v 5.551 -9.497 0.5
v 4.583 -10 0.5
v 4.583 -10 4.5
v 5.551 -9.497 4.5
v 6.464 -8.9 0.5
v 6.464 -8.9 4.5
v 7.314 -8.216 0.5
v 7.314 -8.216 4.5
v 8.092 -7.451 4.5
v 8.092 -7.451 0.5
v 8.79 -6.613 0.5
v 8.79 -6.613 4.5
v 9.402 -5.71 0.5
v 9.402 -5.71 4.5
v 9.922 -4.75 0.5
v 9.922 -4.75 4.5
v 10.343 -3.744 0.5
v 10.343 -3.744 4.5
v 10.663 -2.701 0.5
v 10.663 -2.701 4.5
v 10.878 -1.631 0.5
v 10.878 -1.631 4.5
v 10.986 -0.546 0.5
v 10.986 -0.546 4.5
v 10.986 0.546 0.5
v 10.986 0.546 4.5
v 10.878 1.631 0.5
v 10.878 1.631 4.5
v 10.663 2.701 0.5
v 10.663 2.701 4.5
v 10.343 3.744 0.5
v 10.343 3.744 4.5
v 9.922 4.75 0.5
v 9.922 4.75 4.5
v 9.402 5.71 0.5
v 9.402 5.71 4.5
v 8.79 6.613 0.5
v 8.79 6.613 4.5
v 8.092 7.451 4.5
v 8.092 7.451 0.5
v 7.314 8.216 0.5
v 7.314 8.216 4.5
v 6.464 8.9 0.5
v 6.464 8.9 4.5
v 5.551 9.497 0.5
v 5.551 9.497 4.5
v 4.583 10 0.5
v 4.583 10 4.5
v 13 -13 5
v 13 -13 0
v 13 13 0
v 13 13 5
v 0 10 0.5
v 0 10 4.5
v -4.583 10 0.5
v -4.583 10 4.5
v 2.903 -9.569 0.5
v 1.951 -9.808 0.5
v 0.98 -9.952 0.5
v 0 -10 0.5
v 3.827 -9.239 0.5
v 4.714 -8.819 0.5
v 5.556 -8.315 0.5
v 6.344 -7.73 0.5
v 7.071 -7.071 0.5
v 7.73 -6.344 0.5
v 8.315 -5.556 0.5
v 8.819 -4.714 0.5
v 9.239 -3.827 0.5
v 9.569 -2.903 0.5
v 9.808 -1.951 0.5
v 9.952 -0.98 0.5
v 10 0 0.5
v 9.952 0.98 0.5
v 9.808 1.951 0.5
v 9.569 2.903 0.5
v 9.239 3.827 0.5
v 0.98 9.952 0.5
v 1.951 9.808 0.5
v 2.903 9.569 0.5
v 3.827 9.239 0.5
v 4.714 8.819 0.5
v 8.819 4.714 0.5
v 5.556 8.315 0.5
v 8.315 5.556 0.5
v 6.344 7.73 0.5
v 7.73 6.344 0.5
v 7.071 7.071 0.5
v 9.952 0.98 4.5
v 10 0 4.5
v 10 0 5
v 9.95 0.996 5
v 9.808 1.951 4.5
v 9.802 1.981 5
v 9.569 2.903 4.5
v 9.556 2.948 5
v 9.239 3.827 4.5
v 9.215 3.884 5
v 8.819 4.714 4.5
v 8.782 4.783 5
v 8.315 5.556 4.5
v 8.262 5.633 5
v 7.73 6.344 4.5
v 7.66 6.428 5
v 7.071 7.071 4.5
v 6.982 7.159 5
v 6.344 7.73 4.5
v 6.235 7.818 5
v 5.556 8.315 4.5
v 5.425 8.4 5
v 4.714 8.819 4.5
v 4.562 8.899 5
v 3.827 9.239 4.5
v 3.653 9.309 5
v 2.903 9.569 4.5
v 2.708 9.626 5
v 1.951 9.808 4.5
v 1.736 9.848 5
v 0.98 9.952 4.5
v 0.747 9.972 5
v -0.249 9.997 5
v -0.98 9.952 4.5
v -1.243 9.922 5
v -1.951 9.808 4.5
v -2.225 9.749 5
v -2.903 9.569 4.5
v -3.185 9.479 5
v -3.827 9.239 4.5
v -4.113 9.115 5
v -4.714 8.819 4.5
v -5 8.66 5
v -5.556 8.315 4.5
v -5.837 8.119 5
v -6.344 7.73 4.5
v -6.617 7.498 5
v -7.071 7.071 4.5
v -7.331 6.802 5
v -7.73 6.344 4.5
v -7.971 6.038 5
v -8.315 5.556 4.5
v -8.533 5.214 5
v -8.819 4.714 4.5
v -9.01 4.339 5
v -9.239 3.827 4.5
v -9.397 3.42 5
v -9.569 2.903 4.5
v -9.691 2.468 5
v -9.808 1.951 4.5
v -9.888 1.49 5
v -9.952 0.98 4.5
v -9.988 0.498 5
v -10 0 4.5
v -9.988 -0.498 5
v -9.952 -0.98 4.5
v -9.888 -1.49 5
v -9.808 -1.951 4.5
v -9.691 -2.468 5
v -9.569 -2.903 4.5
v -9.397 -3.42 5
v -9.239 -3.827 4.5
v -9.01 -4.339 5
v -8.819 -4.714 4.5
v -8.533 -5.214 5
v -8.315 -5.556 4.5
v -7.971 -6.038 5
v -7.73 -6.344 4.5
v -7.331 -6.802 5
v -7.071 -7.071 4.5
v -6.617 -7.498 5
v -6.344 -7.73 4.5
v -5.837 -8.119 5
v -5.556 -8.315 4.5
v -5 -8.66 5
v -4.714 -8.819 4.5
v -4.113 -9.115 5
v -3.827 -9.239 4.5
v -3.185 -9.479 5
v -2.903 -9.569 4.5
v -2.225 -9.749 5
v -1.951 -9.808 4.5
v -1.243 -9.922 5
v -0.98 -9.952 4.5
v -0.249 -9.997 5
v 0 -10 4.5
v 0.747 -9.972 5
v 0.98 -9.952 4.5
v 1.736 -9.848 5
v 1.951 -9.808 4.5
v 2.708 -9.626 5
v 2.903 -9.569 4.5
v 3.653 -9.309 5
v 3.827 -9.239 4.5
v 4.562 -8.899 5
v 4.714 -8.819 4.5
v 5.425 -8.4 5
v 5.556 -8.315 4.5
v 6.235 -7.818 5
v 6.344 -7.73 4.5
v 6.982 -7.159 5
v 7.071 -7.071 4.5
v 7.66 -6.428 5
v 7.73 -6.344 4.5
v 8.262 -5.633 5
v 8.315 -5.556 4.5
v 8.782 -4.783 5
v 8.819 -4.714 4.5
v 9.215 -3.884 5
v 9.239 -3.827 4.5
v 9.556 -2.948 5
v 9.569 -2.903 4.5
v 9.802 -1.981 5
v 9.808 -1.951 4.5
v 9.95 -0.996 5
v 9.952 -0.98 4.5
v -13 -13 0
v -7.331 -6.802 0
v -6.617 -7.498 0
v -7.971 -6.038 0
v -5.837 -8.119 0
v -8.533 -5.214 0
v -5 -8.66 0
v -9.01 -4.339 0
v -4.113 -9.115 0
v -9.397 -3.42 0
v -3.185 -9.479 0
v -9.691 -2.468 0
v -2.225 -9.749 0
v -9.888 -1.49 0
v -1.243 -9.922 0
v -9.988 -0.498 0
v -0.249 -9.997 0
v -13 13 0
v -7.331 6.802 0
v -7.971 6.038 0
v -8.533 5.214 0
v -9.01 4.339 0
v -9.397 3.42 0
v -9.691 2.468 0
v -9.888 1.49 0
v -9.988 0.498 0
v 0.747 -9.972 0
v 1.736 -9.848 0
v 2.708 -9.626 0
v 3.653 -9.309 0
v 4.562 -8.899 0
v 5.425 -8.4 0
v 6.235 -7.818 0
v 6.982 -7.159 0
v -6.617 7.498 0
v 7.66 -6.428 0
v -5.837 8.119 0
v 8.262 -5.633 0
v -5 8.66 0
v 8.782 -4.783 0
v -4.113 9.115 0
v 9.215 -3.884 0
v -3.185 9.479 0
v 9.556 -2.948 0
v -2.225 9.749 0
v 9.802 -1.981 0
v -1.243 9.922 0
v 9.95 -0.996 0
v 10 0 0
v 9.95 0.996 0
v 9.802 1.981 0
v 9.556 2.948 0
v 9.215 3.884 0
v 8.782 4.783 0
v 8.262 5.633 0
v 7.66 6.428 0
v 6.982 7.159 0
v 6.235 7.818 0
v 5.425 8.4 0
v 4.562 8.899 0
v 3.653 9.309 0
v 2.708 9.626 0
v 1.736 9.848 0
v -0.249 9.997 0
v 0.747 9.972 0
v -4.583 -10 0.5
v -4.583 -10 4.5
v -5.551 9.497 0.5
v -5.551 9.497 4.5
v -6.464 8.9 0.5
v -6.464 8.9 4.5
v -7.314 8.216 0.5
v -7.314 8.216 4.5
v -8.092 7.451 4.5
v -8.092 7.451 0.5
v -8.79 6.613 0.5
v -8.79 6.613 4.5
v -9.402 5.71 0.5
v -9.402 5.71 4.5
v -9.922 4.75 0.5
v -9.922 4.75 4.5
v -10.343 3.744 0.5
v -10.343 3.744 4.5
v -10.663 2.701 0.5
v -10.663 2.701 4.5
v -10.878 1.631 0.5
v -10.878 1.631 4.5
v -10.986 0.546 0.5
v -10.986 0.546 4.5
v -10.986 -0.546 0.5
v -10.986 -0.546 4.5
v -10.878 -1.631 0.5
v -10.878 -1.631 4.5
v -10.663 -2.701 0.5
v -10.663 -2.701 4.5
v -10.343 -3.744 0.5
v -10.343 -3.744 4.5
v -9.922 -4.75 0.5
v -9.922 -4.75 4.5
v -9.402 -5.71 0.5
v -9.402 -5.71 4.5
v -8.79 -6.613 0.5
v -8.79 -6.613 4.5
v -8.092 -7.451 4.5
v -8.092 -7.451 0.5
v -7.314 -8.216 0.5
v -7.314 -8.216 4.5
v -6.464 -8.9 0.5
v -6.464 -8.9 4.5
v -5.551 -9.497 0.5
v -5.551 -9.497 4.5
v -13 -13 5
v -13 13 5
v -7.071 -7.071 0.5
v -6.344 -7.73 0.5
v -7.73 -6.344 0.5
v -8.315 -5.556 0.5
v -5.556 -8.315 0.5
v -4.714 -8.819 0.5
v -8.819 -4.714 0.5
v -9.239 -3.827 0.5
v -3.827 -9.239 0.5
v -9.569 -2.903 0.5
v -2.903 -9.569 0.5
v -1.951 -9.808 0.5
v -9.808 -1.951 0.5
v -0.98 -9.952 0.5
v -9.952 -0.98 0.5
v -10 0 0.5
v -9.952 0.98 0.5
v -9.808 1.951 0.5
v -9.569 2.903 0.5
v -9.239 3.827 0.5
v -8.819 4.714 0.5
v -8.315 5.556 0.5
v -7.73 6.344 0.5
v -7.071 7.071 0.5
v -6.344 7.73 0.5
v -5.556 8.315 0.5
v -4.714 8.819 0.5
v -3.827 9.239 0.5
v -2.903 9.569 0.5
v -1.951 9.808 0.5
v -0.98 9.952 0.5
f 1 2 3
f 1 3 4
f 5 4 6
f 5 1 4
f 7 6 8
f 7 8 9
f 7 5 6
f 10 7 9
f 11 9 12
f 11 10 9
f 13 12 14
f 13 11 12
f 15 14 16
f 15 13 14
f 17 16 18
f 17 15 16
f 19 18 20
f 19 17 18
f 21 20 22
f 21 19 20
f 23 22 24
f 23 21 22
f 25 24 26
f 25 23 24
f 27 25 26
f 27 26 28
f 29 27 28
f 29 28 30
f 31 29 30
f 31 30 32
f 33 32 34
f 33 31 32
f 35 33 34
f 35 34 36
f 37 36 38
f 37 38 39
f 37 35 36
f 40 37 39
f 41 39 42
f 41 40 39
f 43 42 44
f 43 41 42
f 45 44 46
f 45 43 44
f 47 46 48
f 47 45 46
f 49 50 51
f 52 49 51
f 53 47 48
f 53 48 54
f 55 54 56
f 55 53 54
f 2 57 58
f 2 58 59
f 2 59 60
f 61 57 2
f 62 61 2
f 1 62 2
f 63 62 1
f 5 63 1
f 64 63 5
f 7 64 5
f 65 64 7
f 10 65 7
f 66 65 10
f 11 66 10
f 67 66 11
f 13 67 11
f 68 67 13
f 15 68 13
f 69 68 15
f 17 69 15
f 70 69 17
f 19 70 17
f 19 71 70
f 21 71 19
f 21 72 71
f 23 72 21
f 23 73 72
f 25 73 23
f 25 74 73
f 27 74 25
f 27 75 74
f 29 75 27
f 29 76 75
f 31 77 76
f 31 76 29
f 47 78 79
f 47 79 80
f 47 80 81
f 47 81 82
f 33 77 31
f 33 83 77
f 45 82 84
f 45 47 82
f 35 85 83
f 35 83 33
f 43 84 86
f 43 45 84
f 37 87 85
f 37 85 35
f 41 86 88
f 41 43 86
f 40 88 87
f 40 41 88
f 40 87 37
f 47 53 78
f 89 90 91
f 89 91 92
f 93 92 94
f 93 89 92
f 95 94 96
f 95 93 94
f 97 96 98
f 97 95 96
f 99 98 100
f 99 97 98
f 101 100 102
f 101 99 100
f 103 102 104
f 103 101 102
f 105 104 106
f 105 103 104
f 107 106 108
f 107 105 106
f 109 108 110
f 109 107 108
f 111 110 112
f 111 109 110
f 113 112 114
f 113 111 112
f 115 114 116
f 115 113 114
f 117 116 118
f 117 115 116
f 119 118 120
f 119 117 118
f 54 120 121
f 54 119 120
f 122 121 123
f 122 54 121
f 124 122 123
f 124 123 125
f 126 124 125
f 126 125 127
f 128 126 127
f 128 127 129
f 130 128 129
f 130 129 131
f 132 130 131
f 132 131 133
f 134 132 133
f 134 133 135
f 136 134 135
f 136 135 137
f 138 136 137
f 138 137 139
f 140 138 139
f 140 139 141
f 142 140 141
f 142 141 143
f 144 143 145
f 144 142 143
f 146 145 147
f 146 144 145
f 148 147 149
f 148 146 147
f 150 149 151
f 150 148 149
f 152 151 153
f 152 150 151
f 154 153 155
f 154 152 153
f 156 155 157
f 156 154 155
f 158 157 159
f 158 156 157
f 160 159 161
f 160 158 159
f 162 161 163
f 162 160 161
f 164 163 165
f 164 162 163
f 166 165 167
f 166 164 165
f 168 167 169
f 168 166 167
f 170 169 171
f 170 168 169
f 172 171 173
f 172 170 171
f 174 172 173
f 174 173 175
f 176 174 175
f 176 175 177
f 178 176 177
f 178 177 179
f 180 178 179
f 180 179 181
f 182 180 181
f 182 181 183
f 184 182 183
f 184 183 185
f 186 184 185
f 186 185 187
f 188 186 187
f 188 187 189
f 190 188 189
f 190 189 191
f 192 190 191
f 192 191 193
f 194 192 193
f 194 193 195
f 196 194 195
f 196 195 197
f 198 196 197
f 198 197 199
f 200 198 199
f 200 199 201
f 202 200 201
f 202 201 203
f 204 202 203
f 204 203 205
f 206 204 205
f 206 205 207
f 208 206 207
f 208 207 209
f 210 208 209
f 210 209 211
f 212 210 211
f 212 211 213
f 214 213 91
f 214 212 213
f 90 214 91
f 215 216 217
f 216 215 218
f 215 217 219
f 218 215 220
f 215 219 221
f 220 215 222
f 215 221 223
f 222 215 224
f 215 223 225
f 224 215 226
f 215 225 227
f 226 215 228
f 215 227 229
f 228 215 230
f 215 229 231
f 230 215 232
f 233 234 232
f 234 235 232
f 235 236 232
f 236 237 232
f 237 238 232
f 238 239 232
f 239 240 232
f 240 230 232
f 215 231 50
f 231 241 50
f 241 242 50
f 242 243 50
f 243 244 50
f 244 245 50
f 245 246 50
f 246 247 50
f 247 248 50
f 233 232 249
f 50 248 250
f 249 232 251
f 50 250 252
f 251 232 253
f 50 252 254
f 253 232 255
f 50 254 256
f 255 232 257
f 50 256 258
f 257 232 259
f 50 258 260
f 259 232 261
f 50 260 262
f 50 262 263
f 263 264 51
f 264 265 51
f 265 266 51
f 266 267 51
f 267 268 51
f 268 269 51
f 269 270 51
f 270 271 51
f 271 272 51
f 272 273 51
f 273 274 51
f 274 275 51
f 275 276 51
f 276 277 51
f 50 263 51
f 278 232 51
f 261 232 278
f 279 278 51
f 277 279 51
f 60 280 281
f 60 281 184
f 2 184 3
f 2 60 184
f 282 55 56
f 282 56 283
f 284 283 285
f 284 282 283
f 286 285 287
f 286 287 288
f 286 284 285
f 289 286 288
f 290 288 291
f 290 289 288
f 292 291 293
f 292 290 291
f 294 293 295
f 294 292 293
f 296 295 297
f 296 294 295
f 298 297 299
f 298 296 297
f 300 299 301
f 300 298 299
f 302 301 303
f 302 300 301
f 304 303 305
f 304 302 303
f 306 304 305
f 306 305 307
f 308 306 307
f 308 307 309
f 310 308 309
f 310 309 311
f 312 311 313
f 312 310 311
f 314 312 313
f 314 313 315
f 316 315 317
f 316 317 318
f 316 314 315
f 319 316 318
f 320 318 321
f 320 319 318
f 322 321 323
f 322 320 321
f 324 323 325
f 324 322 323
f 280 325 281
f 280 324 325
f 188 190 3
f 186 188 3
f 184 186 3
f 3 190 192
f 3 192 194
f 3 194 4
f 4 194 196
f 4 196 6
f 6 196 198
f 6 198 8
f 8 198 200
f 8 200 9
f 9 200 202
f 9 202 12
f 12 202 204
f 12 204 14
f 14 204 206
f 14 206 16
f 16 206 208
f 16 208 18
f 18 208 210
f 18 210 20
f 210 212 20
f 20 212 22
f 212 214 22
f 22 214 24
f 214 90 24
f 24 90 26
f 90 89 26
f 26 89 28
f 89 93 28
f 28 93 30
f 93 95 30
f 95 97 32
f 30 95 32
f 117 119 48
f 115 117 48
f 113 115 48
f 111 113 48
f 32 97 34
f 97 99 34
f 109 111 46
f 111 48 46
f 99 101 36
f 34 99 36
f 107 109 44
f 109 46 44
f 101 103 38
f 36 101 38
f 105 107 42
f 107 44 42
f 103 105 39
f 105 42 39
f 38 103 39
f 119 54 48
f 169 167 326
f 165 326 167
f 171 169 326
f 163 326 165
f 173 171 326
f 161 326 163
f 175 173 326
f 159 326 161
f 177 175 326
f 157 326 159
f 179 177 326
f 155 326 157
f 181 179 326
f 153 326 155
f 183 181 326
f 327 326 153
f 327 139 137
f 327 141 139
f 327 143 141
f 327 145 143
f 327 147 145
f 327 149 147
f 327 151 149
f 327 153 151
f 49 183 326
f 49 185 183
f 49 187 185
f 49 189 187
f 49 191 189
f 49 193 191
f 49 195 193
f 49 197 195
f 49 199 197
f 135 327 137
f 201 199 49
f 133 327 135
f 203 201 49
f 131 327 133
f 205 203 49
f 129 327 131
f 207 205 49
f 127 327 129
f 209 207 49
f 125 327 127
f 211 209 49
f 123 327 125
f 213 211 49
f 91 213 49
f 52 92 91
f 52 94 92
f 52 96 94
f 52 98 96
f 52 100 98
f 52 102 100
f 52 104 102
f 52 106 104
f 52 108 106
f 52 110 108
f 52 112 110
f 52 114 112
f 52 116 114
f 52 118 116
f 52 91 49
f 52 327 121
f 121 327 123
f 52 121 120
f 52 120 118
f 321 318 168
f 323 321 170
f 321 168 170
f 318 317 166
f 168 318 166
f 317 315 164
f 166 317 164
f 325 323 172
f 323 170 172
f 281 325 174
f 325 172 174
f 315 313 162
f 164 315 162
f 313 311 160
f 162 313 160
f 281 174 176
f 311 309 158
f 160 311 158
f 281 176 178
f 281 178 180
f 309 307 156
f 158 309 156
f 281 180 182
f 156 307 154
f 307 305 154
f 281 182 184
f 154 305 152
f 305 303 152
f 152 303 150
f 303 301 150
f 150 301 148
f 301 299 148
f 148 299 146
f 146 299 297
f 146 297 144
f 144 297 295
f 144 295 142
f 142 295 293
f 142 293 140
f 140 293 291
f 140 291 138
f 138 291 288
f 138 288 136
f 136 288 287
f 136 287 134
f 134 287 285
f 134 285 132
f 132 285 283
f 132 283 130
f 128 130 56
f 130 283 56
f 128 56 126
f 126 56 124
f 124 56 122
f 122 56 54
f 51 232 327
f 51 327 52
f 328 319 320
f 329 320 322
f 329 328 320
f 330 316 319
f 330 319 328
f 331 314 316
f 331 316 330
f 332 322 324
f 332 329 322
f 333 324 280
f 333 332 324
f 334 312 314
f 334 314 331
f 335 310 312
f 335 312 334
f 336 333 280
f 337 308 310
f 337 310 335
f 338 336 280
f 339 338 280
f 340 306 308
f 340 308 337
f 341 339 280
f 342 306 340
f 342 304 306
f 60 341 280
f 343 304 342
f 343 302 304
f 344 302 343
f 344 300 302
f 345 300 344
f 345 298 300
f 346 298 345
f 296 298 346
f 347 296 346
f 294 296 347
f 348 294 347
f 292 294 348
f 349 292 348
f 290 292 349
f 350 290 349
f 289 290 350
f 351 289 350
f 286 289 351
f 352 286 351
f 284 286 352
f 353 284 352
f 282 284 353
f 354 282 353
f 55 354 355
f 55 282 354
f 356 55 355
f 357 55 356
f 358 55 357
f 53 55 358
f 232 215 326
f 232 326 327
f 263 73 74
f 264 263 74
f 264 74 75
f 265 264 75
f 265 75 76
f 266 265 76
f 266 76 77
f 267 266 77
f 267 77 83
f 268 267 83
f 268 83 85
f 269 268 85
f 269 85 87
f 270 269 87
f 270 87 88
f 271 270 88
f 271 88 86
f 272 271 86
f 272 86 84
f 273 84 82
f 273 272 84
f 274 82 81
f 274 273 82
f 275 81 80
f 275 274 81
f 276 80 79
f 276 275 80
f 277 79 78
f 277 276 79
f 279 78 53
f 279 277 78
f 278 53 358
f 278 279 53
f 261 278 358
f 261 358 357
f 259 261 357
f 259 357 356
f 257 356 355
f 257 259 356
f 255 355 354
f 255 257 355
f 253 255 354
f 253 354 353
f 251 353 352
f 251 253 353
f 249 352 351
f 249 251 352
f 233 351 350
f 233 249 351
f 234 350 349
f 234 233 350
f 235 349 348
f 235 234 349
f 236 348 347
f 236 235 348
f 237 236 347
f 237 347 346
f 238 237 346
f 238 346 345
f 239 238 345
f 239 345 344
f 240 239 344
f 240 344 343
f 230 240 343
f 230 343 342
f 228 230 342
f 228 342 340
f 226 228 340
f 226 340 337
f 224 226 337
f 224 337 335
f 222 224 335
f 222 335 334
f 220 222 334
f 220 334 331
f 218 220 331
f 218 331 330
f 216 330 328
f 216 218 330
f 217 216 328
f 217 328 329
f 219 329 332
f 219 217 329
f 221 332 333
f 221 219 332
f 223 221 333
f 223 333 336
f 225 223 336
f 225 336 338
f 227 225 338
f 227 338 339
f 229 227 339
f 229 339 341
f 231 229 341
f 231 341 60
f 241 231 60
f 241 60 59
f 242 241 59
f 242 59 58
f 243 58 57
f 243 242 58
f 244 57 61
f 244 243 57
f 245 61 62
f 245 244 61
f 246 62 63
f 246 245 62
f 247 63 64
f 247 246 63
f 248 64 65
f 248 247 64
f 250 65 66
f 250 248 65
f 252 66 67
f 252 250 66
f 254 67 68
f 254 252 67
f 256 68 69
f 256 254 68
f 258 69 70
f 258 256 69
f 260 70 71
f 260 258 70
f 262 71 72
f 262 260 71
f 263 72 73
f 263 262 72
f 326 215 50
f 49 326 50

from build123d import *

# Parameters (mm, degrees)
SKETCH_1_W          = 26
SKETCH_1_H          = 26
SKETCH_1_R          = 10
EXTRUDE_1_DEPTH     = 5
CUT_EXTRUDE_START   = 0.5
CUT_EXTRUDE_3_DEPTH = 4


# Read off the part's stored shape, not the designer's step: 切除-拉伸3
with BuildPart() as part:
    # 草图1 → 凸台-拉伸1 (new body)
    with BuildSketch(Plane.XY):
        Rectangle(SKETCH_1_W, SKETCH_1_H)
        Circle(SKETCH_1_R, mode=Mode.SUBTRACT)
    extrude(amount=EXTRUDE_1_DEPTH)

    # 切除-拉伸3 outline → 切除-拉伸3 (cut)
    with BuildSketch(Plane.XY.offset(CUT_EXTRUDE_START)):
        with BuildLine():
            ThreePointArc((4.582575695, -10), (11, 0), (4.582575695, 10))
            Line((4.582575695, 10), (0, 10))
            ThreePointArc((0, 10), (10, 0), (0, -10))
            Line((0, -10), (4.582575695, -10))
        make_face()
        with BuildLine():
            ThreePointArc((0, -10), (-10, 0), (0, 10))
            Line((0, 10), (-4.582575695, 10))
            ThreePointArc((-4.582575695, 10), (-11, 0), (-4.582575695, -10))
            Line((-4.582575695, -10), (0, -10))
        make_face()
    extrude(amount=CUT_EXTRUDE_3_DEPTH, mode=Mode.SUBTRACT)


solid = part.part
